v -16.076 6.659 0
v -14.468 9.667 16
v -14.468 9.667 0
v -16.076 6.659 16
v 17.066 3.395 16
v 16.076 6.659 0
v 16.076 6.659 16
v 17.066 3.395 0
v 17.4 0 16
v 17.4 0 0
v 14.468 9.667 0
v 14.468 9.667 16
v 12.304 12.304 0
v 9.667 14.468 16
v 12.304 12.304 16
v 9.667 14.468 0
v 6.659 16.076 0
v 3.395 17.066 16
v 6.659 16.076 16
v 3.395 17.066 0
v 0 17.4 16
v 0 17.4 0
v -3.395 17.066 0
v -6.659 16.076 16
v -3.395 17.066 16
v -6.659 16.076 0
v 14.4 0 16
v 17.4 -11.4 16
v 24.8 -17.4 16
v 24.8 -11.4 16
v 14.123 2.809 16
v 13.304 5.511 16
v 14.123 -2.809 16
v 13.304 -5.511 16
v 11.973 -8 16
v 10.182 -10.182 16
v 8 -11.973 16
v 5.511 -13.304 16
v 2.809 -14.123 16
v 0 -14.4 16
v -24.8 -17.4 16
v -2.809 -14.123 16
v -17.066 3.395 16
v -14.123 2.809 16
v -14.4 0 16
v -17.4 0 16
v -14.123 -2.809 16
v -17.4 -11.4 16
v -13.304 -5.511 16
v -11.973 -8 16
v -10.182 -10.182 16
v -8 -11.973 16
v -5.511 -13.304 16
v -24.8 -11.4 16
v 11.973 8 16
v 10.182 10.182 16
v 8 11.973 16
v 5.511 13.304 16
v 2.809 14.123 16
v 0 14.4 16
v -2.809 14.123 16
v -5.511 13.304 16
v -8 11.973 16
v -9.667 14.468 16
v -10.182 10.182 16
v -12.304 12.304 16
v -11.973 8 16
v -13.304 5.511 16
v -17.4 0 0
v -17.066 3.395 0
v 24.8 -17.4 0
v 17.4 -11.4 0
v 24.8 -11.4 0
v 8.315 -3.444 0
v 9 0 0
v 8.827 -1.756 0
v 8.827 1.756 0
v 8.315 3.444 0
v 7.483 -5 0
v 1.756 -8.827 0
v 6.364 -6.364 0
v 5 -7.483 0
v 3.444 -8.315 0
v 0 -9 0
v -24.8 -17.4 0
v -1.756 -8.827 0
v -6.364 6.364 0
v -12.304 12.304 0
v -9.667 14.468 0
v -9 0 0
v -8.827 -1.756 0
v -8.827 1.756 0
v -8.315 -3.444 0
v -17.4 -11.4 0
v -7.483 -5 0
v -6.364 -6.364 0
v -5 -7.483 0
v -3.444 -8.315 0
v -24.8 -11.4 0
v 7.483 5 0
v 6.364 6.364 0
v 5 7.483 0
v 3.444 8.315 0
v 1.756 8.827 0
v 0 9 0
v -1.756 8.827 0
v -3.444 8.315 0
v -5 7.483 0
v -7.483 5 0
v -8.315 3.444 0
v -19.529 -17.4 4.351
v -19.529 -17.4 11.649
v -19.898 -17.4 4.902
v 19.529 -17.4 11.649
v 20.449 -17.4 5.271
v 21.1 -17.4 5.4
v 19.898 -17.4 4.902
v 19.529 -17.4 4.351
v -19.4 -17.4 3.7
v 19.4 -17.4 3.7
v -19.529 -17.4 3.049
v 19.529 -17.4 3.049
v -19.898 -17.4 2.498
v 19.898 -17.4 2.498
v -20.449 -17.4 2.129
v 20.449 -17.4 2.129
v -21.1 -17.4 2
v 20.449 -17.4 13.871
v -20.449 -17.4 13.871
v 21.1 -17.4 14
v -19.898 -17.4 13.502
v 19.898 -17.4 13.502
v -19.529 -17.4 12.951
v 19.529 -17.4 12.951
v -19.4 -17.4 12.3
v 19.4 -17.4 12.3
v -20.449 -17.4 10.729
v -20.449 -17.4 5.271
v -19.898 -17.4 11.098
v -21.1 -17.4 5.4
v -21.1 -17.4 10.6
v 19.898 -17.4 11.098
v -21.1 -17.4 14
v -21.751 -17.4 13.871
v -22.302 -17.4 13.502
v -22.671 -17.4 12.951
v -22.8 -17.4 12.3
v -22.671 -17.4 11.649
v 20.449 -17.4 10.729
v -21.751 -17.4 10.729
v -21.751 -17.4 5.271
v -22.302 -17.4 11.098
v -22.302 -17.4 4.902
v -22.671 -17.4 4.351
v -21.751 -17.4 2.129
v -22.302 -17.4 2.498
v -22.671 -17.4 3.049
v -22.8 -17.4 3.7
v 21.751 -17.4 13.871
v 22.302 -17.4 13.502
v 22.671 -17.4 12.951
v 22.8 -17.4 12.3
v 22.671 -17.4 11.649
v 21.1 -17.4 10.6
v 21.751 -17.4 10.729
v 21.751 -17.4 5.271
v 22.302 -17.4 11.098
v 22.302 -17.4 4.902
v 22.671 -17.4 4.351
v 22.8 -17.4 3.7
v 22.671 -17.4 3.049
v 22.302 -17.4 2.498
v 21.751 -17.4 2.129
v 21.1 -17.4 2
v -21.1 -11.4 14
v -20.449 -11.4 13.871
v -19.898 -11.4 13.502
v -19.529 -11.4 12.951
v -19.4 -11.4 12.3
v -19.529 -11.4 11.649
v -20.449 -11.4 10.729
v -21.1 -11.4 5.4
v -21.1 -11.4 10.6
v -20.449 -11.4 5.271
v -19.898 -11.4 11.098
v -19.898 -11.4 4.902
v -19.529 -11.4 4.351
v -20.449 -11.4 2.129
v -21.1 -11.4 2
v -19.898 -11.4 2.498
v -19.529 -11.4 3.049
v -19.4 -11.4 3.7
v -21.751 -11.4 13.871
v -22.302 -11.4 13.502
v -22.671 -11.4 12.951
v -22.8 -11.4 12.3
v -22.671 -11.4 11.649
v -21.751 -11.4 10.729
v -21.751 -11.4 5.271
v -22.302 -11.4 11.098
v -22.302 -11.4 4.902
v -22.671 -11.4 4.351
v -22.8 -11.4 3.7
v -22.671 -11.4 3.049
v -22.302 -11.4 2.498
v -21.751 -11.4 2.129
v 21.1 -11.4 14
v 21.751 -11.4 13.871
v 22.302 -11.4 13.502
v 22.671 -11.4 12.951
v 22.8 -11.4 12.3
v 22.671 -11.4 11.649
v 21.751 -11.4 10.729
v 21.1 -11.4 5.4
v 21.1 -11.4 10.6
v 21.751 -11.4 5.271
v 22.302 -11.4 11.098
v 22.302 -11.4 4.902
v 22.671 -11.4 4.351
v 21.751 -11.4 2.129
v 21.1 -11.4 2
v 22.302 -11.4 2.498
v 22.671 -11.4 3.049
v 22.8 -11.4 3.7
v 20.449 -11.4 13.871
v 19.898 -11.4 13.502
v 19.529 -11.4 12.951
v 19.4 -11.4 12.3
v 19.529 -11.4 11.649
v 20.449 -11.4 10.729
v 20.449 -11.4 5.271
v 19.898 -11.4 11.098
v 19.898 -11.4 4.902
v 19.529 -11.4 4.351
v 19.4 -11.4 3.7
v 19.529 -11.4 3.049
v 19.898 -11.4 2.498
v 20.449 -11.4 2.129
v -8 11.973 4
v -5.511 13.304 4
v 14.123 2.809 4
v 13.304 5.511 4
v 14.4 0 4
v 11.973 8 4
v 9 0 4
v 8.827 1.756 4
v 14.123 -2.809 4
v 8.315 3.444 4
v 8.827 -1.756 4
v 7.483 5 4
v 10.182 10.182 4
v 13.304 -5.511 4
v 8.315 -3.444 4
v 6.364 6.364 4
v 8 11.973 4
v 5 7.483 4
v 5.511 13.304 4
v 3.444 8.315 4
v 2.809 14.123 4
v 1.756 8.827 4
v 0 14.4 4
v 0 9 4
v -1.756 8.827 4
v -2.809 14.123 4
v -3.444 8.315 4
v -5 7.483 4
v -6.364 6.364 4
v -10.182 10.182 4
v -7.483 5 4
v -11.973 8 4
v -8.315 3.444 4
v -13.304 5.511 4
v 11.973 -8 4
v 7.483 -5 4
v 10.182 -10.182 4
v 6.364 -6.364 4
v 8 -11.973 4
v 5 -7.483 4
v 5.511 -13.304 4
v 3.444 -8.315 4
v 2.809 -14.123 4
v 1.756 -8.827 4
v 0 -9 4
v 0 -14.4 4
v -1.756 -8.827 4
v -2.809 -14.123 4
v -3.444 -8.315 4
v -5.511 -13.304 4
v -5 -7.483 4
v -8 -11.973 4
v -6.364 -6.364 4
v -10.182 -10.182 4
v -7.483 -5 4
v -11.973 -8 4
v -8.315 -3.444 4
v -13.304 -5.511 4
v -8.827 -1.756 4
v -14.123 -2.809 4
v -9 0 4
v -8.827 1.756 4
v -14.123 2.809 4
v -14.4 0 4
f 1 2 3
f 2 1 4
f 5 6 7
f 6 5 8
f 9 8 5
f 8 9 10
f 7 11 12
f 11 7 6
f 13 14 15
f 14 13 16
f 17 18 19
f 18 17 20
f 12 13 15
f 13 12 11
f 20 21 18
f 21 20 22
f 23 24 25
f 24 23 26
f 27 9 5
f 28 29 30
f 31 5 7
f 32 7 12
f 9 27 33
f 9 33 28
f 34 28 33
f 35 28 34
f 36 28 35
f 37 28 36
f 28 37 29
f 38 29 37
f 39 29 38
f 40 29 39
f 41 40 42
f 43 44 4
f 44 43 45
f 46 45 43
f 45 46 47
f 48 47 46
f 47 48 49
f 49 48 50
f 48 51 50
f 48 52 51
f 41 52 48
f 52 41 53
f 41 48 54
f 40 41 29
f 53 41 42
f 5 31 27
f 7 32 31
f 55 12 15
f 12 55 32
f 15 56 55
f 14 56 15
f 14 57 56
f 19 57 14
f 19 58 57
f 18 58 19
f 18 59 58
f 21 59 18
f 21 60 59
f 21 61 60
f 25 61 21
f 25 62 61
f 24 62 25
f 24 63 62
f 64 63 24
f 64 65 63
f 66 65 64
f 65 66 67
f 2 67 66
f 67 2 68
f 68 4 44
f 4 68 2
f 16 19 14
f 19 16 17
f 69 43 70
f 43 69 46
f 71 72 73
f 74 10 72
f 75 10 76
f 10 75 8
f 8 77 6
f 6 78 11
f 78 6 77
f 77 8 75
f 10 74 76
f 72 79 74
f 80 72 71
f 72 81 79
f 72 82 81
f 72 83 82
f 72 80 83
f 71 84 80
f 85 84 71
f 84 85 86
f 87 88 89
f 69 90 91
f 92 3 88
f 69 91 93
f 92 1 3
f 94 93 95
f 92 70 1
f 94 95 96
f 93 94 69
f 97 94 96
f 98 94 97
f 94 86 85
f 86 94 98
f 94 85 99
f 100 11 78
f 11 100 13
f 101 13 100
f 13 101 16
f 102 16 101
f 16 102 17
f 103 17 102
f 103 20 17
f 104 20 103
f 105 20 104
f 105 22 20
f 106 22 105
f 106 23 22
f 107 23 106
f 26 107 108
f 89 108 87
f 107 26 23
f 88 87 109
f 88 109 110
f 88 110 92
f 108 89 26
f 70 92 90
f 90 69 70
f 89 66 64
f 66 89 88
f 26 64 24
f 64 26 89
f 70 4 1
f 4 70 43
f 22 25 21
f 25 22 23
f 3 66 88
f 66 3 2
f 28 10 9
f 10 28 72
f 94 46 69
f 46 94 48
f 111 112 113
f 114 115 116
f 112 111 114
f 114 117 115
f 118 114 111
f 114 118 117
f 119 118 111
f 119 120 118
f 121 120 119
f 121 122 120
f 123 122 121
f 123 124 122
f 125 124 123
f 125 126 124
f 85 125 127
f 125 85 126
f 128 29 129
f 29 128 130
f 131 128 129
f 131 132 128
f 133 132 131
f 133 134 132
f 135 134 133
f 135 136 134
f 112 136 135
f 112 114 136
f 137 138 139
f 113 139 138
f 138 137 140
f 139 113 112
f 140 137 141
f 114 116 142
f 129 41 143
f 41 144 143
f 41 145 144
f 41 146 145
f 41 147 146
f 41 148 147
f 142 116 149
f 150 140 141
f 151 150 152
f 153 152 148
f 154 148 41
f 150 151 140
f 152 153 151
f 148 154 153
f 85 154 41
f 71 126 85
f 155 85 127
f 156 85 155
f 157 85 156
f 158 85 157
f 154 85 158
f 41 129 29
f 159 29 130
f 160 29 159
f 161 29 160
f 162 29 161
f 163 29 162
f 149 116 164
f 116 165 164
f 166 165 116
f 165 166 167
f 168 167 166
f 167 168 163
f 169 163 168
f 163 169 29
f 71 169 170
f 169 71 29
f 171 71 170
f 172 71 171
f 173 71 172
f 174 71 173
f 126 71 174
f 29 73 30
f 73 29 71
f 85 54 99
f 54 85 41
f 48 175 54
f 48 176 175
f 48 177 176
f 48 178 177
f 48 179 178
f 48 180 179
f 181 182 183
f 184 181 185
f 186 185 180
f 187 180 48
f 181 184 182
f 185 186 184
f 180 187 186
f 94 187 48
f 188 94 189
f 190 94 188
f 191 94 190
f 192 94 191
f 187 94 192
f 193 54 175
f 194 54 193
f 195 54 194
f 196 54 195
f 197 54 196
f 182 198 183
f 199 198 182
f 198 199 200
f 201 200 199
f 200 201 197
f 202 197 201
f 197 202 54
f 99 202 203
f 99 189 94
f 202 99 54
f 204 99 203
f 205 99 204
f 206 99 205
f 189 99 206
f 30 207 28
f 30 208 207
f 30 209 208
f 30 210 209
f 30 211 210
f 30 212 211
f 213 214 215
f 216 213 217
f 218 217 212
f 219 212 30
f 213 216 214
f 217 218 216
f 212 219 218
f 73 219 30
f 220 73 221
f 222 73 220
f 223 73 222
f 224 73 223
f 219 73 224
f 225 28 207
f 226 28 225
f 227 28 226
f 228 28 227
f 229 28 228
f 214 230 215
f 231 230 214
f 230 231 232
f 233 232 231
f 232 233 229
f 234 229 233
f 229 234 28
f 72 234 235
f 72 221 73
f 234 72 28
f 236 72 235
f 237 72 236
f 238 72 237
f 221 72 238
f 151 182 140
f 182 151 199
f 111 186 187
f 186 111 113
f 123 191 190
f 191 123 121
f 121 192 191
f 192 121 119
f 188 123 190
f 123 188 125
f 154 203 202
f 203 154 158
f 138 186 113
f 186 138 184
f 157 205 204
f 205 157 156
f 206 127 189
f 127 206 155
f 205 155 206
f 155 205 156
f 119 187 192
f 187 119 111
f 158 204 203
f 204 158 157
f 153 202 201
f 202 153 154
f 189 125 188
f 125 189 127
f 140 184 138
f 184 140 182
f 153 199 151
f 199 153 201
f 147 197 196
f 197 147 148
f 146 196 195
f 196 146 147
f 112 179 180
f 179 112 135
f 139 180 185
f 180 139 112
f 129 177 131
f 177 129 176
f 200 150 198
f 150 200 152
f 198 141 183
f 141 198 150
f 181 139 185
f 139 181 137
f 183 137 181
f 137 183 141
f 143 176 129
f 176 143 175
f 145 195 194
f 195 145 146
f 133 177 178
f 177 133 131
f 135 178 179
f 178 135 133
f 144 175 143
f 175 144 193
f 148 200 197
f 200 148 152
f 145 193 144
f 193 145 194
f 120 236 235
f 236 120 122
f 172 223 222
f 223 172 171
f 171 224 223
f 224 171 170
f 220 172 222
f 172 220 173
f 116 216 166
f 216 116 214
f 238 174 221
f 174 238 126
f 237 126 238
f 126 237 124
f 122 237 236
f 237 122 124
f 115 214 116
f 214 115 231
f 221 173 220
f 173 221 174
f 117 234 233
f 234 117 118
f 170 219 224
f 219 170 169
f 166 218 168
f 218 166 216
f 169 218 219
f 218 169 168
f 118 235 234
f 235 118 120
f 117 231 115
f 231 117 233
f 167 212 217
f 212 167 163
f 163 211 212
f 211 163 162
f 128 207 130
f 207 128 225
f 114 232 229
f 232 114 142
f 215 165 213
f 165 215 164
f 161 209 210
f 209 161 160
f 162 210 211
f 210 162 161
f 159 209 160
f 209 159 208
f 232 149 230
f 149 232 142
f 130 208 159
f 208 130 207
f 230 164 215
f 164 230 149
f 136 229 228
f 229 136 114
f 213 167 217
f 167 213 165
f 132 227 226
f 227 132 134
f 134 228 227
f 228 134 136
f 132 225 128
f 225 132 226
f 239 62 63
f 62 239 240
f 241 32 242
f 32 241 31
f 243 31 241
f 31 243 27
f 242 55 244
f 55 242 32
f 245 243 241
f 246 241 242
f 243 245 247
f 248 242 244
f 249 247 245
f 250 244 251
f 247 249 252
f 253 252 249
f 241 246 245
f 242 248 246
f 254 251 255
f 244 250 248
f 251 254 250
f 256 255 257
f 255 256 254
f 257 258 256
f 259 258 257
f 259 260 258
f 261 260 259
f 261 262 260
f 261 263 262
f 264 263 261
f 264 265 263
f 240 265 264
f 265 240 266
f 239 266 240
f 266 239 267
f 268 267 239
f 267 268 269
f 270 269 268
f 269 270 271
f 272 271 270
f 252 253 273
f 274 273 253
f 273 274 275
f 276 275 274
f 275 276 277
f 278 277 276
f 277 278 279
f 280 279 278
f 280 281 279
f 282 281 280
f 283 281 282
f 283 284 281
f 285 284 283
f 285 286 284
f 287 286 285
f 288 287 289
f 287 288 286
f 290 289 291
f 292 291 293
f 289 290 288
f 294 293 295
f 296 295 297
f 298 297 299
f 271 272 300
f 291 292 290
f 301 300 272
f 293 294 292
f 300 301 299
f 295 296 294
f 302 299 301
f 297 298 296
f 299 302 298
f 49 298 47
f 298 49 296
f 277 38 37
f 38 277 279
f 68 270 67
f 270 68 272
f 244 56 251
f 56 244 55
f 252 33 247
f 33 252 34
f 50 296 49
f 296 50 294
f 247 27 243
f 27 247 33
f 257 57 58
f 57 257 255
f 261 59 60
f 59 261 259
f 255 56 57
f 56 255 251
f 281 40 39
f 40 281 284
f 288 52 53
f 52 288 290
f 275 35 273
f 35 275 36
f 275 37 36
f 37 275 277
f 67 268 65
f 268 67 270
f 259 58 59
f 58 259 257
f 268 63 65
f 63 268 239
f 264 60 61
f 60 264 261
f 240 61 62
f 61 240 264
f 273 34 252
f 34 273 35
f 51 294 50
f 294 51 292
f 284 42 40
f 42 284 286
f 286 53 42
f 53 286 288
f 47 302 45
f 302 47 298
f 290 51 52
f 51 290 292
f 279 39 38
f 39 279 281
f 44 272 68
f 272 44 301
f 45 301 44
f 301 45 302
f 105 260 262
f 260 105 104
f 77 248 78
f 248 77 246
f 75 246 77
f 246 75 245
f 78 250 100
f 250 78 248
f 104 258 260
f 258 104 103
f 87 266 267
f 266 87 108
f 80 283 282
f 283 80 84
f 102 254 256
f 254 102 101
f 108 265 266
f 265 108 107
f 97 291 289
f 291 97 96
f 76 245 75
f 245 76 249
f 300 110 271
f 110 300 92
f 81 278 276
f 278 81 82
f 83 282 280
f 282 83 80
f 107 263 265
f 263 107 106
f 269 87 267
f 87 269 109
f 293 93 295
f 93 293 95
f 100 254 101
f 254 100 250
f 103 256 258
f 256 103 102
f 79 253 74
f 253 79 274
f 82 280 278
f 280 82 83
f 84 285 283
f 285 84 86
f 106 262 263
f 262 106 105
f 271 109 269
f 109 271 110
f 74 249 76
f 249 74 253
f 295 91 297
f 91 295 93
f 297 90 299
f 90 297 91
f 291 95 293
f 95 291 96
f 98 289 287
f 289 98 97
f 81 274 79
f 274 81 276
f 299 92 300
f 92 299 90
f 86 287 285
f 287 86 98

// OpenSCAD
// file: SpoolholderVars.scad
screwM3Diameter=3+0.4;
screwM3HolderDiameter=screwM3Diameter+2*2;
screwM3HolderRadius=screwM3HolderDiameter/2;
nutM3Height=2;
screw16M3Height=16;
screw30M3Height=30;

rodM8Diameter=8+0.6;
nutM8Diameter=14.4+1.2;
nutM8Height=6.4+1.0;

nutM8HolderDiameter=nutM8Diameter+2*3;
nutM8HolderRadius=nutM8HolderDiameter/2;


length=120;
bottomHeight=10;
topHeight=8;
topWidth=16;
connectorThickness=4;
bottomNutM8HoleHeight=nutM8Height+1.0;


bearingDiameter=28+0.8;
bearingHolderWallThickness=3;
bearingHolderDiameter=bearingDiameter+2*bearingHolderWallThickness;
bearingHolderRadius=bearingHolderDiameter/2;

bearingHolderLength=bearingHolderDiameter+2*screwM3HolderDiameter;
bearingHolderHoleDiameter=18;
bearingHolderBottomHeight=4;
bearingHolderScrewOffset=(bearingHolderLength-screwM3HolderDiameter)/2;
bearingHolderScrewHolderHeight=screw16M3Height-nutM3Height-topHeight;


coneHeight=5;
coneBigDiameter=56;
coneBigRadius=coneBigDiameter/2;
coneSmallDiameter=48;
coneSmallRadius=coneSmallDiameter/2;

coneNutHolderHoleDiameter=16;
coneNutHolderHoleRadius=coneNutHolderHoleDiameter/2;
coneNutHolderWallThickness=4;
coneNutHolderWithWallDiameter=coneNutHolderHoleDiameter+2*coneNutHolderWallThickness;
coneNutHolderScrewOffset=coneNutHolderHoleRadius+screwM3HolderRadius;
coneNutHolderBottomHeight=3;
coneNutHolderTotalHeight=screw30M3Height-nutM3Height-coneHeight;
coneNutHolderNutM8HoleHeight=nutM8Height-1.0;
// main file
include <SpoolholderVars.scad>

difference()
{
	union()
	{
		cylinder(d=bearingHolderDiameter,h=topWidth,$fn=32);
		
		translate([-bearingHolderRadius,-bearingHolderRadius,0])
		cube([bearingHolderDiameter,bearingHolderRadius,topWidth]);
		
		translate([-bearingHolderLength/2,-bearingHolderRadius,0])
		cube([bearingHolderLength,bearingHolderScrewHolderHeight,topWidth]);
	}
	
	translate([0,0,bearingHolderBottomHeight])
	cylinder(d=bearingDiameter,h=topWidth,$fn=32);
	
	translate([0,0,-1])
	cylinder(d=bearingHolderHoleDiameter,h=topWidth+2,$fn=32);
	
	// Holes for M3 screws
	for(t=[[-1,0,1],[-1,1,-1],[1,0,1],[1,1,-1]])
	{
		x=t[0]*bearingHolderScrewOffset;
		z=t[1]*topWidth+t[2]*screwM3HolderDiameter/2;
		
		translate([x,-bearingHolderRadius-1,z])
		rotate([-90,0,0])
		cylinder(d=screwM3Diameter,h=bearingHolderScrewHolderHeight+2,$fn=16);
	}
}
